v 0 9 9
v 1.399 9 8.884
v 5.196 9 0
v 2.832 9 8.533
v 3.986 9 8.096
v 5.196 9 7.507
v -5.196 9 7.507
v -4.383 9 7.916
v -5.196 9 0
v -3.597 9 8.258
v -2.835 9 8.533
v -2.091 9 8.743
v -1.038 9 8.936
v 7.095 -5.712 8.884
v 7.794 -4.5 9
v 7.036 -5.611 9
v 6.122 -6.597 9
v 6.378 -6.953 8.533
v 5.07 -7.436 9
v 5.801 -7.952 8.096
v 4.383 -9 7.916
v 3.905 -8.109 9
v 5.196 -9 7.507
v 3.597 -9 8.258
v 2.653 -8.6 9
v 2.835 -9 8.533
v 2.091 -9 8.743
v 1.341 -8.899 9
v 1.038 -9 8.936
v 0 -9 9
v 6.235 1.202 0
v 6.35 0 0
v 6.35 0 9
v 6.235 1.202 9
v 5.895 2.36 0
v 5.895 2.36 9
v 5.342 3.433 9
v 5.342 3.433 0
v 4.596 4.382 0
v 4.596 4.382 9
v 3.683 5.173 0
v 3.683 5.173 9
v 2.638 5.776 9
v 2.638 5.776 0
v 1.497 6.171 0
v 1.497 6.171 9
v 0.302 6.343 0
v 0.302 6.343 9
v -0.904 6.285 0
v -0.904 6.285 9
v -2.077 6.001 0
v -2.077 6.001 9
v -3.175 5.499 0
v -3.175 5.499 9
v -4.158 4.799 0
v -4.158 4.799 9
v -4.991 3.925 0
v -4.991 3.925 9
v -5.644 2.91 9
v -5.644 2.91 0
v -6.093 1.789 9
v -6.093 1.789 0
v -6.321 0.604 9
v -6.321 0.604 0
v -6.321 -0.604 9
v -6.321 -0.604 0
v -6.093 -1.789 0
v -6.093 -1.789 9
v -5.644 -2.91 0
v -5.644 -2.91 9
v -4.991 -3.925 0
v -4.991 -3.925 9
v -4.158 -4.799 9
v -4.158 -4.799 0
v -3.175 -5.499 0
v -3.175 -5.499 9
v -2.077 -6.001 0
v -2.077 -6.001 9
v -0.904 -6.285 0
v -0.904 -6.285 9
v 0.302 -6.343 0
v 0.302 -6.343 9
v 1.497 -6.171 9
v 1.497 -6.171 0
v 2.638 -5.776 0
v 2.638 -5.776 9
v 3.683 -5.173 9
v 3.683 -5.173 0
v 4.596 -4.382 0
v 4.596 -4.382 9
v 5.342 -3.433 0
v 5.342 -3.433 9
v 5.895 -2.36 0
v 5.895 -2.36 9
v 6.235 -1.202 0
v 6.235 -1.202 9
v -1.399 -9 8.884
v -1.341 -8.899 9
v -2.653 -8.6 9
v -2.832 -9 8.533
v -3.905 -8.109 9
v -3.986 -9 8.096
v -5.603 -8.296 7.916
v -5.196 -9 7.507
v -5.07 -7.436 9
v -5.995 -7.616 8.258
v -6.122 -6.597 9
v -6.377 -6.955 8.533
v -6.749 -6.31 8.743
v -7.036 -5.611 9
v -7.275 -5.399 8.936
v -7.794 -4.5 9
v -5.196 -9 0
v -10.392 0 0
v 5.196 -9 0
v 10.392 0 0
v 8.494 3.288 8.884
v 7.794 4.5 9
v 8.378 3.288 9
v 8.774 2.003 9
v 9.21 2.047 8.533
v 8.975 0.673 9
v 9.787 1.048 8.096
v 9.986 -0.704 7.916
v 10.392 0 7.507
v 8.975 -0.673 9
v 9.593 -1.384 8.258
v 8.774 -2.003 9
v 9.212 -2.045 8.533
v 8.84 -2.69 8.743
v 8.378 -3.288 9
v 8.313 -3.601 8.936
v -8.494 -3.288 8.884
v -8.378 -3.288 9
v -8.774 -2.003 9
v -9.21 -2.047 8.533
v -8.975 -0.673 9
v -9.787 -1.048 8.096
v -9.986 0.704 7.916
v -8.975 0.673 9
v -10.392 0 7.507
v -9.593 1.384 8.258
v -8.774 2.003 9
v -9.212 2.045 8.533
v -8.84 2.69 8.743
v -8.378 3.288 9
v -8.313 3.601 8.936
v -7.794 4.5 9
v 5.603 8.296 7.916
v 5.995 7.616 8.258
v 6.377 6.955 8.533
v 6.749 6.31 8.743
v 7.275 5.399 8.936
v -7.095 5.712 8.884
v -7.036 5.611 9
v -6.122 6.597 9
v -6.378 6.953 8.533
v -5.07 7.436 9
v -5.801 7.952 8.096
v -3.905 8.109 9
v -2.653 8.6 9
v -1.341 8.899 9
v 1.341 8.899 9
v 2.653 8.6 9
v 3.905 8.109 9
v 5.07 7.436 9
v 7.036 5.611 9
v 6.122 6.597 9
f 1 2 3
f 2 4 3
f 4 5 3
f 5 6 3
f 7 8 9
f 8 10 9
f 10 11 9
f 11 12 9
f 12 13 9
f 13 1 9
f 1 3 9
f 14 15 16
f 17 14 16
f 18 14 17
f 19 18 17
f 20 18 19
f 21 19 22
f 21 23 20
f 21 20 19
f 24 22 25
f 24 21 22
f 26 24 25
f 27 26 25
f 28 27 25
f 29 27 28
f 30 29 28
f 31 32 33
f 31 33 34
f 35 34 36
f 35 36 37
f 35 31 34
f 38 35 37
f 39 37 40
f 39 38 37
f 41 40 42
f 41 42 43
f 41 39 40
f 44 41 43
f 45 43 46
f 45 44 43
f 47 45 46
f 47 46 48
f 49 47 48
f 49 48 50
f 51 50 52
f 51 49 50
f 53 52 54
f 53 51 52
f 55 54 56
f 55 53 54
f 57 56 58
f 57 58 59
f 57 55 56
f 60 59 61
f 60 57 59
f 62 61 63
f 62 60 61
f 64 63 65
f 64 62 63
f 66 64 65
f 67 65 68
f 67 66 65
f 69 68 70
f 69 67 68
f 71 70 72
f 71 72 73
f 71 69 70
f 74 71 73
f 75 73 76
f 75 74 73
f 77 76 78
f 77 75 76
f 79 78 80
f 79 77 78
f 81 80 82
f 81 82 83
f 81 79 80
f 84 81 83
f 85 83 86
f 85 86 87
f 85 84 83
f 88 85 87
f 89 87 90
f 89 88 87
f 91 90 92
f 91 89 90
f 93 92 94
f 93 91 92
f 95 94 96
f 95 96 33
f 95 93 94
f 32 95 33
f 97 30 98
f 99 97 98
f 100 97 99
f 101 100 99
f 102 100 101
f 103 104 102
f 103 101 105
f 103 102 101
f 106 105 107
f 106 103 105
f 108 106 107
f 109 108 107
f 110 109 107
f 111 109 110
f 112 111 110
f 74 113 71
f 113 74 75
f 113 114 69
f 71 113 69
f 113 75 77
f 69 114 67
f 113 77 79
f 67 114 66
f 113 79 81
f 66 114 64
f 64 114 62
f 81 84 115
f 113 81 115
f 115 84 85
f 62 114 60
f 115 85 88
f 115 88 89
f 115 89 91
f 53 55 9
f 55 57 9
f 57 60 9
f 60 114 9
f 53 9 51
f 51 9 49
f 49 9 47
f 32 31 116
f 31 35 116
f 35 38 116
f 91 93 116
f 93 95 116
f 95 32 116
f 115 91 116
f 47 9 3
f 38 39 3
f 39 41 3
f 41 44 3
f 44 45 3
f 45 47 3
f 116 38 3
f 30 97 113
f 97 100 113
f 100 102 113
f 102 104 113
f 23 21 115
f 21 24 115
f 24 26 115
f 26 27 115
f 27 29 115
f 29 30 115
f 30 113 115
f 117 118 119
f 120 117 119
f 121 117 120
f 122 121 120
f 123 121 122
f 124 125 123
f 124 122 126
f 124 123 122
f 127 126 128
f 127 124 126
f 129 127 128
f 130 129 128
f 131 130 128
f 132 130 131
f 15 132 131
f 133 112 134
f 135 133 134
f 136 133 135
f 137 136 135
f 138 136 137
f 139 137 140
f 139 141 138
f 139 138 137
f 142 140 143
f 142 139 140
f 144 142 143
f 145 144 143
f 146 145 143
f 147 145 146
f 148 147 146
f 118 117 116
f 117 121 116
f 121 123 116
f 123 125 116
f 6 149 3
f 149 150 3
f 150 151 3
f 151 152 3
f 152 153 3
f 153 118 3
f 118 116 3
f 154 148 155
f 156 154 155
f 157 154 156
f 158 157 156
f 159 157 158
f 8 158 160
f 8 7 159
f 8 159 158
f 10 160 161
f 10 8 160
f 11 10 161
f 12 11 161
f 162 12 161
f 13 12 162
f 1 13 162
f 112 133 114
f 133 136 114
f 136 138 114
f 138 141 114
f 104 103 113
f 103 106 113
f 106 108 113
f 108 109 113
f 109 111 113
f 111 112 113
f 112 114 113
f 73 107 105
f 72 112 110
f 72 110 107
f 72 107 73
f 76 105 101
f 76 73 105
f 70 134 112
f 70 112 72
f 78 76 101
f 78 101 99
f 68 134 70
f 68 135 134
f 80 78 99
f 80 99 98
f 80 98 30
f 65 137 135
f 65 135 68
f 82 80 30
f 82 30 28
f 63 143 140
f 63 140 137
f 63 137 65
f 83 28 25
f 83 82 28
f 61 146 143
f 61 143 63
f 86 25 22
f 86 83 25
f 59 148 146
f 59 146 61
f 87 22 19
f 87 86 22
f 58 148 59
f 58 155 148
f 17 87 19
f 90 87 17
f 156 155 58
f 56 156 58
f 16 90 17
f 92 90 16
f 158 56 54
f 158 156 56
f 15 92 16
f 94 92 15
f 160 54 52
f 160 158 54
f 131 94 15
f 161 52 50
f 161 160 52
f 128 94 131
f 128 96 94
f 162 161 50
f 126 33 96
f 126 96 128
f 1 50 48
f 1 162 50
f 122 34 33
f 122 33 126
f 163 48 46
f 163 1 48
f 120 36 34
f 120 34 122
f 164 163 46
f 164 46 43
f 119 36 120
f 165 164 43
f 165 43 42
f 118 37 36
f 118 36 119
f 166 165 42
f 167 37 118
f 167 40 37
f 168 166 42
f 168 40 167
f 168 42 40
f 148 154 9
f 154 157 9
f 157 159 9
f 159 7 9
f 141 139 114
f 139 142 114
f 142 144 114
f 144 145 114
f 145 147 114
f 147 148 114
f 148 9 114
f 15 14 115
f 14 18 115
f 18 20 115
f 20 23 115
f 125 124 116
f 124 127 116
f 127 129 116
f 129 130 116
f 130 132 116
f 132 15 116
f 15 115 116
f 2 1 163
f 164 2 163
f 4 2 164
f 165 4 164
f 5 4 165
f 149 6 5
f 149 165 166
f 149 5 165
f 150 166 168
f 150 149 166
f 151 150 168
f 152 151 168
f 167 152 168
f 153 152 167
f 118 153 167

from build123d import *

# Parameters (mm, degrees)
CROQUIS1_R              = 6.35
SALIENTE_EXTRUIR1_DEPTH = 9
CROQUIS2_R              = 17.950209201
CROQUIS2_R_2            = 9
CORTAR_EXTRUIR1_DEPTH   = 9
CORTAR_EXTRUIR1_TAPER   = 43


with BuildPart() as part:
    # Croquis1 → Saliente-Extruir1 (new body)
    with BuildSketch(Plane.XY):
        Polygon((-10.392304845, 0), (-5.196152423, -9), (5.196152423, -9), (10.392304845, 0), (5.196152423, 9), (-5.196152423, 9), align=None)
        Circle(CROQUIS1_R, mode=Mode.SUBTRACT)
    extrude(amount=SALIENTE_EXTRUIR1_DEPTH)

    # Croquis2 → Cortar-Extruir1 (cut)
    with BuildSketch(Plane.XY.offset(9)):
        with Locations((-0.193993057, 0)):
            Circle(CROQUIS2_R)
        Circle(CROQUIS2_R_2, mode=Mode.SUBTRACT)
    extrude(amount=-CORTAR_EXTRUIR1_DEPTH, taper=CORTAR_EXTRUIR1_TAPER, mode=Mode.SUBTRACT)


solid = part.part
